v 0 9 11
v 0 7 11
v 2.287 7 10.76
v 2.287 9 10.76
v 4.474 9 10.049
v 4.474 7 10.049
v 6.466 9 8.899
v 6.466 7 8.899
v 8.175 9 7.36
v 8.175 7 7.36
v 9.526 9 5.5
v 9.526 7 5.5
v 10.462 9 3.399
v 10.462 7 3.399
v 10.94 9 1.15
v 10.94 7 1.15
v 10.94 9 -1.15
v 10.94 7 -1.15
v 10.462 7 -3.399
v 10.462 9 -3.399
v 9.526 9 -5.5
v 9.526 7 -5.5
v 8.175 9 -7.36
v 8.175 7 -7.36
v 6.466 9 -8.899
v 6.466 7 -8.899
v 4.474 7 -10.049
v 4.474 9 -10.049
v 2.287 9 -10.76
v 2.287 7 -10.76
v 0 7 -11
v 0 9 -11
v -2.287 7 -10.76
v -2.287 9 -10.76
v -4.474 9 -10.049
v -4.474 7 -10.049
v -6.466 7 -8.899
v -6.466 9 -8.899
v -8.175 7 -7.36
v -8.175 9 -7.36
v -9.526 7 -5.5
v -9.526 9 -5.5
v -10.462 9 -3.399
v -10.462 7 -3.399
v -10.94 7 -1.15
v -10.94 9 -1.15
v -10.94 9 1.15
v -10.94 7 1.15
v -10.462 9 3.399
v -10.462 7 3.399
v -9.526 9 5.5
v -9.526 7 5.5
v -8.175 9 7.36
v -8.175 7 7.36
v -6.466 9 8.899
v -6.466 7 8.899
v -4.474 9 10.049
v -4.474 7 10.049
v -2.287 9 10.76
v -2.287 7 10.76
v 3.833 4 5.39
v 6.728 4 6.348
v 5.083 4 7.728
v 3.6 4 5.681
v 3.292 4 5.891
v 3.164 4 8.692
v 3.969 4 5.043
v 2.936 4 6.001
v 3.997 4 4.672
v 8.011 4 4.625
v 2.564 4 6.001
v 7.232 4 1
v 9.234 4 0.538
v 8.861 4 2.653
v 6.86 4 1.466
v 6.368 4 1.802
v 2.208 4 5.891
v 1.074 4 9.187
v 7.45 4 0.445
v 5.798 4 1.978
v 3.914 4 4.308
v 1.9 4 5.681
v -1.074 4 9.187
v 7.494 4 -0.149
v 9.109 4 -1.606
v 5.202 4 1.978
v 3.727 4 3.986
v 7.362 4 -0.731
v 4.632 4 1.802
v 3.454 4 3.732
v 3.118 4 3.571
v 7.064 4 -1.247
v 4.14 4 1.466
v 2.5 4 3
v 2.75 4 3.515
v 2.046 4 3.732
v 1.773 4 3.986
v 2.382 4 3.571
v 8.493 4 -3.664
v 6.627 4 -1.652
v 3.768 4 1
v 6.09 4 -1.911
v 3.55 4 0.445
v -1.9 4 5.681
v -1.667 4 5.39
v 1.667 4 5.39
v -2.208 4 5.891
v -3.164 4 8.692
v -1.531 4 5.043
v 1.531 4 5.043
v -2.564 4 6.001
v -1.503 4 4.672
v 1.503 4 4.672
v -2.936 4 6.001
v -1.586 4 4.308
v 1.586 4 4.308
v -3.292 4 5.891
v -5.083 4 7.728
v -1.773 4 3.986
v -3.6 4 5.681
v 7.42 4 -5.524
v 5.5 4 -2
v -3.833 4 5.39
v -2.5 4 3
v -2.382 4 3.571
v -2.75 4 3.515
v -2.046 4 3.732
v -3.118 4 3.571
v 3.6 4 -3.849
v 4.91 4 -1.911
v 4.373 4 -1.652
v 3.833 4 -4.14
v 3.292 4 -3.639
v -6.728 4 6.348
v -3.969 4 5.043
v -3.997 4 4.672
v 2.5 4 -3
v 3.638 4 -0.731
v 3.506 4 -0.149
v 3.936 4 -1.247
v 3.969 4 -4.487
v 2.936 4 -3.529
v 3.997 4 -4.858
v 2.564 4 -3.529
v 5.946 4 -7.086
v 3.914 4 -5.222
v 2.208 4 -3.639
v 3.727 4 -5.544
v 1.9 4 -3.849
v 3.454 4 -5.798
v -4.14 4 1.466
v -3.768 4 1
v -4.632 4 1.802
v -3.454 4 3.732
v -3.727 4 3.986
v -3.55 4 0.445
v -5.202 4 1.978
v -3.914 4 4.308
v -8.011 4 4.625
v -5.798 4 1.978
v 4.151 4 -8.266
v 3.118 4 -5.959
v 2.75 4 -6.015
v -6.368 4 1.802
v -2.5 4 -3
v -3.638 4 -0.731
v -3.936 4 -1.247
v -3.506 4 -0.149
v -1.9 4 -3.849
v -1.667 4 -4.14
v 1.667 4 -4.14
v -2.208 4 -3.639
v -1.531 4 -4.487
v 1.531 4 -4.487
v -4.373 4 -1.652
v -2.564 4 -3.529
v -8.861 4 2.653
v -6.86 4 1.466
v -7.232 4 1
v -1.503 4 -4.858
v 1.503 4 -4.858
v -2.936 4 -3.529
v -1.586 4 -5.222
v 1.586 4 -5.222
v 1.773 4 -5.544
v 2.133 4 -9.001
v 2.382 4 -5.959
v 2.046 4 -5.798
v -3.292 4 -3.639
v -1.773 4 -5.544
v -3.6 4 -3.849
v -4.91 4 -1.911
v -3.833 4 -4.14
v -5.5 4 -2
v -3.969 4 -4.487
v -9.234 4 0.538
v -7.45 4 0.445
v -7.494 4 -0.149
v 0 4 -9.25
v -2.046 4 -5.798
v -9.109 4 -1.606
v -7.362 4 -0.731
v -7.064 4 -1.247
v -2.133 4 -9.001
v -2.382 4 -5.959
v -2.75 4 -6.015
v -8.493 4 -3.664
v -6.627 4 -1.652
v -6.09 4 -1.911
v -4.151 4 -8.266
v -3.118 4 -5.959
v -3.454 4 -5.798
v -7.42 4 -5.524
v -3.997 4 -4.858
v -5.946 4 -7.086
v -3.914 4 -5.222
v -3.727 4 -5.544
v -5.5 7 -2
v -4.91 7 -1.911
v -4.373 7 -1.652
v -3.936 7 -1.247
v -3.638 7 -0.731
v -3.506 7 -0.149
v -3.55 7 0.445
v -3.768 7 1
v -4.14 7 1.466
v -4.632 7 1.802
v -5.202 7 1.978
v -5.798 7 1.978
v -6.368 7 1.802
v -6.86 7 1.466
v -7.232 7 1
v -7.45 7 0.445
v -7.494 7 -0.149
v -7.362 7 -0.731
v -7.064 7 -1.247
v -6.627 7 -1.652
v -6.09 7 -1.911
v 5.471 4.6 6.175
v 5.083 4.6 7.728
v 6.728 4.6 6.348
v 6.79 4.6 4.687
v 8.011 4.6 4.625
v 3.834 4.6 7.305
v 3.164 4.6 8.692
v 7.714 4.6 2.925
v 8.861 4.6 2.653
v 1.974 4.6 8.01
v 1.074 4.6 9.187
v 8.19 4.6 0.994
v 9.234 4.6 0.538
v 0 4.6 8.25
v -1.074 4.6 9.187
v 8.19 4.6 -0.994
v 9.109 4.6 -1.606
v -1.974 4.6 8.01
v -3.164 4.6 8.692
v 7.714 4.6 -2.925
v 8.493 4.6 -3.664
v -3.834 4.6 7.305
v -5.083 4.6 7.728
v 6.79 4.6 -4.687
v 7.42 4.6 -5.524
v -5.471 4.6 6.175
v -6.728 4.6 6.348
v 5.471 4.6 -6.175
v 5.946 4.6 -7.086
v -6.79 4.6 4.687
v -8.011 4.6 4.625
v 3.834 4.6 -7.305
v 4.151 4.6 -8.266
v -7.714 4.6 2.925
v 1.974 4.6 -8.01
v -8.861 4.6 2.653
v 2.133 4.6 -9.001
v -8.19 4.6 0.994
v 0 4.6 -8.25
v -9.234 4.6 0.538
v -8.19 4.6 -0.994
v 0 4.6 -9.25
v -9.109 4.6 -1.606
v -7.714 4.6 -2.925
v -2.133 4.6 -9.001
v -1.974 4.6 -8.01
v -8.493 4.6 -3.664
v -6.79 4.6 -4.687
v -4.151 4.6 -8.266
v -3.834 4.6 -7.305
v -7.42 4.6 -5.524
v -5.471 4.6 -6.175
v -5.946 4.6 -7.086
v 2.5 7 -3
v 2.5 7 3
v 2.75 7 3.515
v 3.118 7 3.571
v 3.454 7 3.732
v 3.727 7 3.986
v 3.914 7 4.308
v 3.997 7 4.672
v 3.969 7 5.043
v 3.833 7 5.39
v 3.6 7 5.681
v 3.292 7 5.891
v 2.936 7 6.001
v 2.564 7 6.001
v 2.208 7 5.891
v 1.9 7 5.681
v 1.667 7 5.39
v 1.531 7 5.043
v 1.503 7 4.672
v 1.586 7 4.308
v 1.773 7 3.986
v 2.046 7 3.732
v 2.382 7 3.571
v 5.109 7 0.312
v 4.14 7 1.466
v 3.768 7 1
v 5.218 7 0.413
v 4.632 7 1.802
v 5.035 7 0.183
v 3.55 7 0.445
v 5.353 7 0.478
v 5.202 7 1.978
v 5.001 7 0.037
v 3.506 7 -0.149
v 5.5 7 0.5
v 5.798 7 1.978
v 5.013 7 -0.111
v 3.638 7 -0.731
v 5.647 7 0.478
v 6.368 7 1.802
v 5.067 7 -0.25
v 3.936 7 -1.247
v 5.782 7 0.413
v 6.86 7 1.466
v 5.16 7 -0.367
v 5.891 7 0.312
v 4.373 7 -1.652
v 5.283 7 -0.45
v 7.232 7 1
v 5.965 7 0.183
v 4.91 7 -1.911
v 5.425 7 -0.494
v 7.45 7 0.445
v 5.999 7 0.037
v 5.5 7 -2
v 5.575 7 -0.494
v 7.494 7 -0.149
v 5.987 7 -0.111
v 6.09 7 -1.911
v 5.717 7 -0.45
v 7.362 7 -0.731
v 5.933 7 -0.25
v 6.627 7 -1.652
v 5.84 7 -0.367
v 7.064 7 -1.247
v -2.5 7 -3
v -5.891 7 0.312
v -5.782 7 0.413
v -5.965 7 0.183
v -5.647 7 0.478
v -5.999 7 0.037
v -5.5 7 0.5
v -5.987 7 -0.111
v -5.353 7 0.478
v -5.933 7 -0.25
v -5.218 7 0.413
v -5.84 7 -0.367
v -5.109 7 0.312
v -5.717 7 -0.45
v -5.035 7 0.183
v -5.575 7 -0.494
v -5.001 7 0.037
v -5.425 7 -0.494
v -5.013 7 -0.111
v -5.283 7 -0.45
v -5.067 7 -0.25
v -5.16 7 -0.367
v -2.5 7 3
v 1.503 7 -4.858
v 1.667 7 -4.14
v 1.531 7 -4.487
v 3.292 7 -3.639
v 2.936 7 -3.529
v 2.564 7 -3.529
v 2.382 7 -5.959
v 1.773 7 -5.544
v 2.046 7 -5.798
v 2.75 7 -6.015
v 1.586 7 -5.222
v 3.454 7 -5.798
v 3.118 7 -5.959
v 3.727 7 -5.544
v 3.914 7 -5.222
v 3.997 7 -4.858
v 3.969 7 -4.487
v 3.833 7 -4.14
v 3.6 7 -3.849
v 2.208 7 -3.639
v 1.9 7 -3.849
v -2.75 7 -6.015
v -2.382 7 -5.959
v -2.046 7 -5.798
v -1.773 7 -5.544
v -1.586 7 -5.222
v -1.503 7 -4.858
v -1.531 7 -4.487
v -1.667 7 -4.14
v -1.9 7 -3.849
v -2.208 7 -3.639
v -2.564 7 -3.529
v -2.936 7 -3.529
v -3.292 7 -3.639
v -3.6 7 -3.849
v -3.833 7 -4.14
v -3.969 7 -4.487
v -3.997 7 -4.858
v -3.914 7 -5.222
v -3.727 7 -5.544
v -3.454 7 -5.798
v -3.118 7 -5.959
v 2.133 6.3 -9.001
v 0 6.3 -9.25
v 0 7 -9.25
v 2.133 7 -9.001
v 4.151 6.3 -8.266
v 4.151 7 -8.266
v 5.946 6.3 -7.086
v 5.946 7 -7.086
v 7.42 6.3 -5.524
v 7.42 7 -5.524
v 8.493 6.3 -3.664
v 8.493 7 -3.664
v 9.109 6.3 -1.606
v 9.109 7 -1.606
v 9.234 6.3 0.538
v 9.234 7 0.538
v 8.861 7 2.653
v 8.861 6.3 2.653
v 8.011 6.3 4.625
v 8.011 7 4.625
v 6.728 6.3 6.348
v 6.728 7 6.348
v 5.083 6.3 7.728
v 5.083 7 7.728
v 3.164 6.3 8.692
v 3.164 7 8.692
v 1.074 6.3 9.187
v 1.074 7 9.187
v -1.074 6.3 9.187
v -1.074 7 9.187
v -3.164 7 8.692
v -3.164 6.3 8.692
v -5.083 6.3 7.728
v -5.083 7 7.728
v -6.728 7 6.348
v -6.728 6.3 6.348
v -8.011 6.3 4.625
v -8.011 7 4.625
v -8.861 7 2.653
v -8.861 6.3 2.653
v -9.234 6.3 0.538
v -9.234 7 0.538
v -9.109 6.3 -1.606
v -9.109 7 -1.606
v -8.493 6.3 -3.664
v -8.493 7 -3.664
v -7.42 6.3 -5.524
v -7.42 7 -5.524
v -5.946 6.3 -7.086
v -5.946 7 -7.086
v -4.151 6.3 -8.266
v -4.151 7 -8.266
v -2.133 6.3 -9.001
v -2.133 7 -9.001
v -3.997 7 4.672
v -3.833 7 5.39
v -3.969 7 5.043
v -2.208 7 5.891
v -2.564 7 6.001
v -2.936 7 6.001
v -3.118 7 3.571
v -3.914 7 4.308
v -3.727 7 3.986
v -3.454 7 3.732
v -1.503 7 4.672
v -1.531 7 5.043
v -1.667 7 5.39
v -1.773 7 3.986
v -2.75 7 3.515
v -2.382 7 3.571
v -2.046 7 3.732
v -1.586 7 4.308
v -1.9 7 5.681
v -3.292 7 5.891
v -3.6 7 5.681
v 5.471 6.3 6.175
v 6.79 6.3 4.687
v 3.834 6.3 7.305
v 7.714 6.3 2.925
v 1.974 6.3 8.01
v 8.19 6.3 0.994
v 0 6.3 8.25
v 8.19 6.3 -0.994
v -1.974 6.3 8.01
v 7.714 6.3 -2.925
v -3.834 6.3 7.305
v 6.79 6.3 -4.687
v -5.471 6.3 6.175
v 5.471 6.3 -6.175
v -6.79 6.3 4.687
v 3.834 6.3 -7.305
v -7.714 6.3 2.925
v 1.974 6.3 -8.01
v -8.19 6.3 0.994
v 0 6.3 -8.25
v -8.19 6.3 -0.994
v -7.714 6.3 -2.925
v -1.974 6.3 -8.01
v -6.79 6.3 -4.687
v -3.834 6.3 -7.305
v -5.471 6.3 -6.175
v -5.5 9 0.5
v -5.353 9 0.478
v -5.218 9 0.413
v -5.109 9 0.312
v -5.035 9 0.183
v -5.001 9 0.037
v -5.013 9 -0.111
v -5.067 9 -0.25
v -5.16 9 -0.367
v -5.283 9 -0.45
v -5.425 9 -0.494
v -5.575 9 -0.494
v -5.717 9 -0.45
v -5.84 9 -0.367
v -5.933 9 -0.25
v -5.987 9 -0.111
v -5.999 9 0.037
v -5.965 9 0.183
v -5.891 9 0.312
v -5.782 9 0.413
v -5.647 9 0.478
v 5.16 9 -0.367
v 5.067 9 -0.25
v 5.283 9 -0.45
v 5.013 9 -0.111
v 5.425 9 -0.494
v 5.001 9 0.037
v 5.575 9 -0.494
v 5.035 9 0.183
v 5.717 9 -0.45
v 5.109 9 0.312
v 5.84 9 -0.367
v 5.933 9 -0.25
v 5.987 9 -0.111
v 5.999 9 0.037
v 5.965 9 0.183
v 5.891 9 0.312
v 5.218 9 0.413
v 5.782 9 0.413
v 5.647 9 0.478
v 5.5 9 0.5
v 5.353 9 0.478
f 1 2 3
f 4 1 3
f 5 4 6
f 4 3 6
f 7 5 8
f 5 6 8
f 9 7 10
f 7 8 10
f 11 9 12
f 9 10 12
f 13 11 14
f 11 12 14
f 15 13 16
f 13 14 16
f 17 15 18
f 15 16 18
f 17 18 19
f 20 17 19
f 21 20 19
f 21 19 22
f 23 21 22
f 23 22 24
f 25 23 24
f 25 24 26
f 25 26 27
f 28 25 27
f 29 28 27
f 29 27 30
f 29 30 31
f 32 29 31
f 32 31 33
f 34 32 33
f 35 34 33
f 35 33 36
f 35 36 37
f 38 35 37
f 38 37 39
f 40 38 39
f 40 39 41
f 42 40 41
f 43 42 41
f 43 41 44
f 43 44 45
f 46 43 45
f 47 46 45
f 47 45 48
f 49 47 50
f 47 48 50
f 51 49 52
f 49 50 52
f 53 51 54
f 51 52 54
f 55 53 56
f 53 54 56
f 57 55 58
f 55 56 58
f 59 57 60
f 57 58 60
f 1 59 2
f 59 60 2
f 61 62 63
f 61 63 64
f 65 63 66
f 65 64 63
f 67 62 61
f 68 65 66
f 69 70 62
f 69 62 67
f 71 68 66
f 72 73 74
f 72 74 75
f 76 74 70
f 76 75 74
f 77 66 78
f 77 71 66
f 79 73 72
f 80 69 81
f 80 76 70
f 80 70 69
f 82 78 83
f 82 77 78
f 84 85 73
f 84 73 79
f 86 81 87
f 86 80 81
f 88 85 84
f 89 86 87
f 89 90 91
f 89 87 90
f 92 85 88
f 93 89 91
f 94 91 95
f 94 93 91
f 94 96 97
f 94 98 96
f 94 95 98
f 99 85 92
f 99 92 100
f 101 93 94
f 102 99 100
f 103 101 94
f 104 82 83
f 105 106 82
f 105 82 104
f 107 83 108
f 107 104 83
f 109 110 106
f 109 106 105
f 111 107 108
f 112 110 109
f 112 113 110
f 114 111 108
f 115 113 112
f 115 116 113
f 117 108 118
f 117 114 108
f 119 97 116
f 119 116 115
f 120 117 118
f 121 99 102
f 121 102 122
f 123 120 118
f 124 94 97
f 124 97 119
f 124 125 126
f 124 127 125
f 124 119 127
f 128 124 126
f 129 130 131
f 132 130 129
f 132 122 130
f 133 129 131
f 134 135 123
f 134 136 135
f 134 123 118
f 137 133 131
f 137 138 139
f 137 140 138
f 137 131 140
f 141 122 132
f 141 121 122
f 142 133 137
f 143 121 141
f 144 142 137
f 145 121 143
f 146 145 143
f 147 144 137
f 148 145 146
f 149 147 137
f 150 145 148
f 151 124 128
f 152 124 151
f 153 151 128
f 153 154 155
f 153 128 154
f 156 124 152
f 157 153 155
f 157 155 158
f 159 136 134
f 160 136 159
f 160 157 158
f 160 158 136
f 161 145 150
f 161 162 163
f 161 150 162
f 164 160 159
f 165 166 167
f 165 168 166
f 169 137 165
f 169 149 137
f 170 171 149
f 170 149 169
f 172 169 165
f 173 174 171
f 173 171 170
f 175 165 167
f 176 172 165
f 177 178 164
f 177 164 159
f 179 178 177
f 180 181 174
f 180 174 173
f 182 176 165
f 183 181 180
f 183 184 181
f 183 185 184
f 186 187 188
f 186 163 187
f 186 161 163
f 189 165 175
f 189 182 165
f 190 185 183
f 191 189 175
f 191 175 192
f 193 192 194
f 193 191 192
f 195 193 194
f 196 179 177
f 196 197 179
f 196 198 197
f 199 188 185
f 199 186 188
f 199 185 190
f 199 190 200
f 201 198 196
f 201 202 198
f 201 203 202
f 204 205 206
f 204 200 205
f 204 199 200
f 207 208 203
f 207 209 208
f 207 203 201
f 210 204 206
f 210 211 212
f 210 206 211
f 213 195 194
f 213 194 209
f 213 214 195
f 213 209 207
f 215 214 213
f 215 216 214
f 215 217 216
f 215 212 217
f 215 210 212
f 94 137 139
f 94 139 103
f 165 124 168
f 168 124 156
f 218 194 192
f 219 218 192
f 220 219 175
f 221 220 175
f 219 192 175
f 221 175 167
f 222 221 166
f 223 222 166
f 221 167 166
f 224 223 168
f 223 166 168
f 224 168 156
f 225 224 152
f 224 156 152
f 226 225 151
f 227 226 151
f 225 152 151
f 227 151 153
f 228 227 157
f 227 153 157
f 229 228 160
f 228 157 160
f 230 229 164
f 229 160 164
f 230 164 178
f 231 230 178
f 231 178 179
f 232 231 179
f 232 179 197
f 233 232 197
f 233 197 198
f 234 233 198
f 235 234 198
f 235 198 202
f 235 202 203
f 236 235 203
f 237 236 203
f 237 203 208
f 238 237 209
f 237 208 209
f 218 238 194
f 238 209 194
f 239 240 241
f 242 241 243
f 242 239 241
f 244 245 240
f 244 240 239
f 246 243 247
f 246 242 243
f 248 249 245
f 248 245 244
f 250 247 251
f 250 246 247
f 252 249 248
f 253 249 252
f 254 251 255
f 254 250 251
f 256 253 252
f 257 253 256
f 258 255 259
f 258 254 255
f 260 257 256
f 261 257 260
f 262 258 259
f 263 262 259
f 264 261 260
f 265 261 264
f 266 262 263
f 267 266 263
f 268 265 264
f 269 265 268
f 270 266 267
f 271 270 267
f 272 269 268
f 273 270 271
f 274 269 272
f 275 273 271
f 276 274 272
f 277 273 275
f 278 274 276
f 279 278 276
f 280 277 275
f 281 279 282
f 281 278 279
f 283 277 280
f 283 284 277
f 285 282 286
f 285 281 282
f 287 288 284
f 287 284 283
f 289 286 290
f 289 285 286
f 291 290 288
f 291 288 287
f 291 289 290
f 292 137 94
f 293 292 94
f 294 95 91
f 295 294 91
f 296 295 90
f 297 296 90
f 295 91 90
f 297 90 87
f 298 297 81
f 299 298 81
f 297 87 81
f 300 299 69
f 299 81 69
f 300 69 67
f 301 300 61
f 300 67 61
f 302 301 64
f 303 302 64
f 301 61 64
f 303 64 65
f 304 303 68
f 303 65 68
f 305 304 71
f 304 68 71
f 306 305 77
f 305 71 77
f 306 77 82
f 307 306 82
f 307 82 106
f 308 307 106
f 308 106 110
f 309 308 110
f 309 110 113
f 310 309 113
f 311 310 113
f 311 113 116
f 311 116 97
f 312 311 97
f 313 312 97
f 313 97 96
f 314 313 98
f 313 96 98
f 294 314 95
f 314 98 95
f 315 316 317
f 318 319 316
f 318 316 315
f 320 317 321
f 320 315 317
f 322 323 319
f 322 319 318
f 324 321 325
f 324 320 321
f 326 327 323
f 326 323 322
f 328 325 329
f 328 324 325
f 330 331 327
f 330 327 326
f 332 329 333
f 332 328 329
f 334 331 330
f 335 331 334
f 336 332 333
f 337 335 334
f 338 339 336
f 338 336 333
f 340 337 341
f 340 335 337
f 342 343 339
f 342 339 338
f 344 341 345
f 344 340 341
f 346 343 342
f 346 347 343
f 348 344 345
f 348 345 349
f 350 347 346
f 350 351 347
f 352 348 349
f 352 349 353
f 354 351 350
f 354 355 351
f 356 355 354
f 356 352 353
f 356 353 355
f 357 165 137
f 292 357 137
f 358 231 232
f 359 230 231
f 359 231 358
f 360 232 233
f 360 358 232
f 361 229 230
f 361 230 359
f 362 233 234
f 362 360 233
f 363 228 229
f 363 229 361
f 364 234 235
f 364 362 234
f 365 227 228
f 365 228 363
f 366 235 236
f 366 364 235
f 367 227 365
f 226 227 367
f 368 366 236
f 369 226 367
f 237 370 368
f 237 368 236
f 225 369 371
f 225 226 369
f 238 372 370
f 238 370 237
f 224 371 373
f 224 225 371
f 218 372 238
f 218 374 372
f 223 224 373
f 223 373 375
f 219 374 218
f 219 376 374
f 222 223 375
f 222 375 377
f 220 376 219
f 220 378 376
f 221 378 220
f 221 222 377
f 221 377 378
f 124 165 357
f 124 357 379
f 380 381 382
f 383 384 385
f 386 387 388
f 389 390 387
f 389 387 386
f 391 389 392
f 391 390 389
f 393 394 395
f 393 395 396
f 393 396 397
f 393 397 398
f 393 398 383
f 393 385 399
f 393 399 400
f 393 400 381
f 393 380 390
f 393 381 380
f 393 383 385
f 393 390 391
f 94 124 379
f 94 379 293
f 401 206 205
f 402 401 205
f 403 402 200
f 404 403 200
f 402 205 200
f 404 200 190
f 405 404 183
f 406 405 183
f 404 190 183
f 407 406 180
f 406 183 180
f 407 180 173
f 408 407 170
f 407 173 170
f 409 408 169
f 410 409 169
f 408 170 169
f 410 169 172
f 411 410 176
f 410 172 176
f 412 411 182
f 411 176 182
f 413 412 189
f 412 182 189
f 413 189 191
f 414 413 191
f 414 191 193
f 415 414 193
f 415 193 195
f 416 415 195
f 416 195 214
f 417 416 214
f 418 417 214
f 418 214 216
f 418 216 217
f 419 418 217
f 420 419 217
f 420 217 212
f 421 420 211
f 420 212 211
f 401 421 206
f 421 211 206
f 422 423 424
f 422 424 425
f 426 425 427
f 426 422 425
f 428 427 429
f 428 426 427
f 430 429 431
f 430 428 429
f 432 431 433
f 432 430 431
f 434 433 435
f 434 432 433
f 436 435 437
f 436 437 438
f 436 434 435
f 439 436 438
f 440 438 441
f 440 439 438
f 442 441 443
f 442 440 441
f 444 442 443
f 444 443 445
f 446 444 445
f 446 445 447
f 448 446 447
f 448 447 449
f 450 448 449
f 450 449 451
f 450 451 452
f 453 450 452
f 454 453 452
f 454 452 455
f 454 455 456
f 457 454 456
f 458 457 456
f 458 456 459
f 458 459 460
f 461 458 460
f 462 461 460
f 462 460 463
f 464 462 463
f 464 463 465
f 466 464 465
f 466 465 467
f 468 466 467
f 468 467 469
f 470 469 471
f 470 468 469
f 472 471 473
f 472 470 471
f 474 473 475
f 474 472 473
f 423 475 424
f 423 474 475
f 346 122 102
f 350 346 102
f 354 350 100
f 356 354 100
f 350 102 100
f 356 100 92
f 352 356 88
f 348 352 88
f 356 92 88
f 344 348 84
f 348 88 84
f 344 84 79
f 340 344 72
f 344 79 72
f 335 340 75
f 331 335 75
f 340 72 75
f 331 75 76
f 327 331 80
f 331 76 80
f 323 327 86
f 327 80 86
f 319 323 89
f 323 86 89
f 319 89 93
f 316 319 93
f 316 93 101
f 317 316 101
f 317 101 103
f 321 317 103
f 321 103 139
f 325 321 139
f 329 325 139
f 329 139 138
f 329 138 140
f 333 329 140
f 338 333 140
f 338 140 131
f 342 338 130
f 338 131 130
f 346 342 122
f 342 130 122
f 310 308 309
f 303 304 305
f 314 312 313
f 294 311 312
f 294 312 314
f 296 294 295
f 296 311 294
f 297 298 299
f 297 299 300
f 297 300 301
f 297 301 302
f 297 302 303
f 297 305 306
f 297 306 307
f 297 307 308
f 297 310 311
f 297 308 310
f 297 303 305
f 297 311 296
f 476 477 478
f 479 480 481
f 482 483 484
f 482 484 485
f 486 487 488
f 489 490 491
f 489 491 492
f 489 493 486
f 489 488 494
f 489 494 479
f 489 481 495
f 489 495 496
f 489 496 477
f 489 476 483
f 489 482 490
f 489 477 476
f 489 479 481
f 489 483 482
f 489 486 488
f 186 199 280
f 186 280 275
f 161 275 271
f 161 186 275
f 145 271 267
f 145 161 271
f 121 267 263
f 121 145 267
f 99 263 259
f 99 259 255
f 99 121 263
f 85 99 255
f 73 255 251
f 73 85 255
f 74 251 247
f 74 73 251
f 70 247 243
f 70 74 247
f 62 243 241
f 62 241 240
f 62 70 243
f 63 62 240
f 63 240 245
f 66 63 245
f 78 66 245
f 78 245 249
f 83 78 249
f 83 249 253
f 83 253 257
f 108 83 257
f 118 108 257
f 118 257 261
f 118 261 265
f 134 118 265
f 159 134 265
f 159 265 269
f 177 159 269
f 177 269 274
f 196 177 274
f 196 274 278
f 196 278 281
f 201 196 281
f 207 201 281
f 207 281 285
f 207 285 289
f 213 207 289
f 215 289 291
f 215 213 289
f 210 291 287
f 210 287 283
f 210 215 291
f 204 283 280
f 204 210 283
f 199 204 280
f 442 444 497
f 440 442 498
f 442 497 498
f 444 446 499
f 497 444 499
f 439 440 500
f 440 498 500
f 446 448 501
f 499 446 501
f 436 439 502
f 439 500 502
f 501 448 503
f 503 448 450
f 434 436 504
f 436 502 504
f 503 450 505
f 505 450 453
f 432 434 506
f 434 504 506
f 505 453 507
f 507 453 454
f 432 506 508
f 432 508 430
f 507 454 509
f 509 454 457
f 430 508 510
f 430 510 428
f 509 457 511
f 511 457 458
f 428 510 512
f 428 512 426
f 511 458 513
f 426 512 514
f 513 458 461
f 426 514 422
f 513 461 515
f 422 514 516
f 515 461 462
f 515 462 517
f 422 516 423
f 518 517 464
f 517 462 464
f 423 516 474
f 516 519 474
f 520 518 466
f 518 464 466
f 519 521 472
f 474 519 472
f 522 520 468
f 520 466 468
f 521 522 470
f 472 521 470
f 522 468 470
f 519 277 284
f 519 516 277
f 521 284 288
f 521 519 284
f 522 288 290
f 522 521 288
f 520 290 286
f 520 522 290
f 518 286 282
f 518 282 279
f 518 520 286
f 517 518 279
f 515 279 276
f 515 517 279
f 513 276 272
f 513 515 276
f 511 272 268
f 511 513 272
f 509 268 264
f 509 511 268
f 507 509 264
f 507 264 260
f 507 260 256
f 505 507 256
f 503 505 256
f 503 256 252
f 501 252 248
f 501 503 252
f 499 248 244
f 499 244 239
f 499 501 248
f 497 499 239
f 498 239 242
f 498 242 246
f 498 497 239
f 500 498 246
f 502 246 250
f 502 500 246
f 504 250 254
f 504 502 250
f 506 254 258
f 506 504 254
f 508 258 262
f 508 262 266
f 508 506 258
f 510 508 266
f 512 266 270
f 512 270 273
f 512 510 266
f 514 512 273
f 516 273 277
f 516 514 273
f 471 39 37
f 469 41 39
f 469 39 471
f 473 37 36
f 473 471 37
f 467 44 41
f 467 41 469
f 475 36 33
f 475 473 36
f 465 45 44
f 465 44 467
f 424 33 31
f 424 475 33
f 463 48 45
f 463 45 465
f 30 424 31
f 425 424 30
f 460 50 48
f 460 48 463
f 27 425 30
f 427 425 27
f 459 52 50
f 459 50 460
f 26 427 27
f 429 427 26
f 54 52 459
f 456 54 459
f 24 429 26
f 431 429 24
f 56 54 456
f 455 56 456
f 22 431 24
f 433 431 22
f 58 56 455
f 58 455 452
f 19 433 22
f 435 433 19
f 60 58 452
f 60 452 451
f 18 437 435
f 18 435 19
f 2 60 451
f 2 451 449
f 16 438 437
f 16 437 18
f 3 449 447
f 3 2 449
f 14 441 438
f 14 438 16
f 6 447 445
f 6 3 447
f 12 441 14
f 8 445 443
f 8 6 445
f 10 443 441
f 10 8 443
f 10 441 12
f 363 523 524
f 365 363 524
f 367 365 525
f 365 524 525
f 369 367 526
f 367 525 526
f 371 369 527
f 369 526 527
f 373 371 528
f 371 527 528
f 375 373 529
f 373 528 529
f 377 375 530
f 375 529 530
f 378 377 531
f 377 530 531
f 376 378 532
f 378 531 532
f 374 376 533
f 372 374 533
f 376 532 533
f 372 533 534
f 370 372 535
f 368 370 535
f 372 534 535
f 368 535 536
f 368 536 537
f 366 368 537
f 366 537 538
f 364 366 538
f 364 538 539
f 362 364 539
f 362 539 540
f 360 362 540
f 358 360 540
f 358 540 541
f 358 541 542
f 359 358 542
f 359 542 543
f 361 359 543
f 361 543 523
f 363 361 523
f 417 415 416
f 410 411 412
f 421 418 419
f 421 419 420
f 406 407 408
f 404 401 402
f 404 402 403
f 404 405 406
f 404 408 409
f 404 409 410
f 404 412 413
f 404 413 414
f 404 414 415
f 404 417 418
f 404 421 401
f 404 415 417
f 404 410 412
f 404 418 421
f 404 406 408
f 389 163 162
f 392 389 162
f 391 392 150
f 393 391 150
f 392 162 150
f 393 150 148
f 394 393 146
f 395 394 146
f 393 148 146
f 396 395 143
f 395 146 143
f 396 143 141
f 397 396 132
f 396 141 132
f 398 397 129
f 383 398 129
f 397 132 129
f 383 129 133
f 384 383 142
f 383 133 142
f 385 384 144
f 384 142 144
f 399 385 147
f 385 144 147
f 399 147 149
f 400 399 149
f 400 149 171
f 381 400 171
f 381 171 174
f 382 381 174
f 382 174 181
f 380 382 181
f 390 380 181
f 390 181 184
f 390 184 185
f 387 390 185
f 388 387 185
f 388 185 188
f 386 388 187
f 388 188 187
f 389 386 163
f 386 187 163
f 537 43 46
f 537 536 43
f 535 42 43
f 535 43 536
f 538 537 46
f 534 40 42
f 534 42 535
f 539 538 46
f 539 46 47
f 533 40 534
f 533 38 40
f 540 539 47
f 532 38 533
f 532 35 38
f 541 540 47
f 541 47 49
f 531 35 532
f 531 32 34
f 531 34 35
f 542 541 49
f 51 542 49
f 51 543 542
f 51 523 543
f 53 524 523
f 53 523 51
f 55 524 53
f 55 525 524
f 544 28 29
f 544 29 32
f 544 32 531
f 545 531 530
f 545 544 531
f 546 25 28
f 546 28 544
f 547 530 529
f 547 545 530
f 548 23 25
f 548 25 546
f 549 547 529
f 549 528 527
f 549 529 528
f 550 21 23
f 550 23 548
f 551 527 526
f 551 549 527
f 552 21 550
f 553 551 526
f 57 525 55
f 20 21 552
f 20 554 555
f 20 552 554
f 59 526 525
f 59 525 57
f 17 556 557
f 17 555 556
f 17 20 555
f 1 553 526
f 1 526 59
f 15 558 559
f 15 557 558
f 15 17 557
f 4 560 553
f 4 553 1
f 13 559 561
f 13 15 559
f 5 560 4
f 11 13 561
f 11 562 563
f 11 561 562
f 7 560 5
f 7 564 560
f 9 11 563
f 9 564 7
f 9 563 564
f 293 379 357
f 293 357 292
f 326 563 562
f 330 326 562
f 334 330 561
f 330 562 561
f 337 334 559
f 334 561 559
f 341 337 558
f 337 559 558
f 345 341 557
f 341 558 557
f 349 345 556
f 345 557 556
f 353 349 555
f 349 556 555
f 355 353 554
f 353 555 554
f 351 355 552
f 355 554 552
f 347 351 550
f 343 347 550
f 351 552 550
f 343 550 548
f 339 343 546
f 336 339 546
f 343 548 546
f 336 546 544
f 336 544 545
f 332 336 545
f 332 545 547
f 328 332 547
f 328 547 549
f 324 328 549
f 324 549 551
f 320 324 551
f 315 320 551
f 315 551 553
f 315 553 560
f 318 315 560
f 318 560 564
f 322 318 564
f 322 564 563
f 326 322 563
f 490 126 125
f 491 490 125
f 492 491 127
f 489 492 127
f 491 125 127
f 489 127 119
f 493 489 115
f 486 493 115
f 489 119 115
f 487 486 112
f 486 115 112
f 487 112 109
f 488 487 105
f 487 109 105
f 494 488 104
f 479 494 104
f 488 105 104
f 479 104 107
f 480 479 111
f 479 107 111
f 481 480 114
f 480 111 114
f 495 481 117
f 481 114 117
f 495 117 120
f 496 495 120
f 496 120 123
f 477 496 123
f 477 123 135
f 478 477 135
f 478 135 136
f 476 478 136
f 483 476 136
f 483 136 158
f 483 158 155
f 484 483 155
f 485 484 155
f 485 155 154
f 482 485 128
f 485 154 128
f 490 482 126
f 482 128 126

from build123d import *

# Parameters (mm, degrees)
SKETCH_1_R           = 11
EXTRUDE_1_DEPTH      = 9
SKETCH_2_R           = 0.5
CUT_EXTRUDE_1_DEPTH  = 18.972200756
SKETCH_3_R           = 16.549134696
SKETCH_3_R_2         = 9.25
CUT_EXTRUDE_2_DEPTH  = 7
SKETCH_4_W           = 2
SKETCH_4_H           = 1.7
SKETCH_5_W           = 5
SKETCH_5_H           = 6
CUT_EXTRUDE_3_DEPTH  = 7
SKETCH_8_R           = 1.25
CUT_EXTRUDE_6_DEPTH  = 1.5
SKETCH_9_W           = 7
SKETCH_9_H           = 8
SKETCH_9_W_2         = 5
SKETCH_9_H_2         = 6
CUT_EXTRUDE_7_DEPTH  = 2
CHAMFER_1_SIZE       = 0.5
SKETCH_10_R          = 16.70563627
CUT_EXTRUDE_8_DEPTH  = 4
SKETCH_11_R          = 2
CUT_EXTRUDE_9_DEPTH  = 3
SKETCH_12_R          = 1.25
CUT_EXTRUDE_10_DEPTH = 3


with BuildPart() as part:
    # 草图1 → 凸台-拉伸1 (new body)
    with BuildSketch(Plane(origin=(0, 0, 0), x_dir=(1, 0, 0), z_dir=(0, 1, 0))):
        with Locations(Location((0, 0, 0), (0, 0, 270))):
            Circle(SKETCH_1_R)
    extrude(amount=EXTRUDE_1_DEPTH)

    # 草图2 → 切除-拉伸1 (cut, through all)
    with BuildSketch(Plane(origin=(0, 9, 0), x_dir=(1, 0, 0), z_dir=(0, 1, 0))):
        with Locations(Location((-5.5, 0, 0), (0, 0, 270))):
            Circle(SKETCH_2_R)
        with Locations(Location((5.5, 0, 0), (0, 0, 270))):
            Circle(SKETCH_2_R)
    extrude(amount=-CUT_EXTRUDE_1_DEPTH, mode=Mode.SUBTRACT)

    # 草图3 → 切除-拉伸2 (cut)
    with BuildSketch(Plane.XZ):
        Circle(SKETCH_3_R)
        with Locations(Location((0, 0, 0), (0, 0, 270))):
            Circle(SKETCH_3_R_2, mode=Mode.SUBTRACT)
    extrude(amount=-CUT_EXTRUDE_2_DEPTH, mode=Mode.SUBTRACT)

    # 草图4 → 切除-旋转1 (revolve, cut)
    with BuildSketch(Plane.XY, mode=Mode.PRIVATE) as cut_revolve_1_sk:
        with Locations((-9.25, 5.45)):
            Rectangle(SKETCH_4_W, SKETCH_4_H)
        with Locations((-9.25, 2.35)):
            Rectangle(SKETCH_4_W, SKETCH_4_H)
    revolve(cut_revolve_1_sk.sketch.rotate(Axis((0, 0, 0), (0, 1, 0)), 270), axis=Axis((0, 0, 0), (0, 1, 0)), mode=Mode.SUBTRACT)

    # 草图5 → 切除-拉伸3 (cut)
    with BuildSketch(Plane.XZ):
        Rectangle(SKETCH_5_W, SKETCH_5_H)
    extrude(amount=-CUT_EXTRUDE_3_DEPTH, mode=Mode.SUBTRACT)

    # 草图8 → 切除-拉伸6 (cut)
    with BuildSketch(Plane.XZ):
        with Locations(Location((-5.5, 0, 0), (0, 0, 270))):
            Circle(SKETCH_8_R)
        with Locations(Location((5.5, 0, 0), (0, 0, 270))):
            Circle(SKETCH_8_R)
    extrude(amount=-CUT_EXTRUDE_6_DEPTH, mode=Mode.SUBTRACT)

    # 草图9 → 切除-拉伸7 (cut)
    with BuildSketch(Plane.XZ):
        Rectangle(SKETCH_9_W, SKETCH_9_H)
        Rectangle(SKETCH_9_W_2, SKETCH_9_H_2, mode=Mode.SUBTRACT)
    extrude(amount=-CUT_EXTRUDE_7_DEPTH, mode=Mode.SUBTRACT)

    # 倒角1
    chamfer_1_edges = [part.edges().sort_by_distance(p)[0] for p in [
        (0, 0, 9.25),
    ]]
    chamfer(chamfer_1_edges, length=CHAMFER_1_SIZE)

    # 草图10 → 切除-拉伸8 (cut)
    with BuildSketch(Plane(origin=(0, 0, 0), x_dir=(-1, 0, 0), z_dir=(0, -1, 0))):
        Circle(SKETCH_10_R)
    extrude(amount=-CUT_EXTRUDE_8_DEPTH, mode=Mode.SUBTRACT)

    # 草图11 → 切除-拉伸9 (cut)
    with BuildSketch(Plane.XZ.offset(-4)):
        with Locations(Location((-5.5, 0, 0), (0, 0, 270))):
            Circle(SKETCH_11_R)
        with Locations(Location((5.5, 0, 0), (0, 0, 270))):
            Circle(SKETCH_11_R)
    extrude(amount=-CUT_EXTRUDE_9_DEPTH, mode=Mode.SUBTRACT)

    # 草图12 → 切除-拉伸10 (cut)
    with BuildSketch(Plane.XZ.offset(-4)):
        with Locations(Location((-2.75, 4.765, 0), (0, 0, 270))):
            Circle(SKETCH_12_R)
        with Locations(Location((2.75, 4.765, 0), (0, 0, 270))):
            Circle(SKETCH_12_R)
        with Locations(Location((2.75, -4.765, 0), (0, 0, 270))):
            Circle(SKETCH_12_R)
        with Locations(Location((-2.75, -4.765, 0), (0, 0, 270))):
            Circle(SKETCH_12_R)
    extrude(amount=-CUT_EXTRUDE_10_DEPTH, mode=Mode.SUBTRACT)


solid = part.part
